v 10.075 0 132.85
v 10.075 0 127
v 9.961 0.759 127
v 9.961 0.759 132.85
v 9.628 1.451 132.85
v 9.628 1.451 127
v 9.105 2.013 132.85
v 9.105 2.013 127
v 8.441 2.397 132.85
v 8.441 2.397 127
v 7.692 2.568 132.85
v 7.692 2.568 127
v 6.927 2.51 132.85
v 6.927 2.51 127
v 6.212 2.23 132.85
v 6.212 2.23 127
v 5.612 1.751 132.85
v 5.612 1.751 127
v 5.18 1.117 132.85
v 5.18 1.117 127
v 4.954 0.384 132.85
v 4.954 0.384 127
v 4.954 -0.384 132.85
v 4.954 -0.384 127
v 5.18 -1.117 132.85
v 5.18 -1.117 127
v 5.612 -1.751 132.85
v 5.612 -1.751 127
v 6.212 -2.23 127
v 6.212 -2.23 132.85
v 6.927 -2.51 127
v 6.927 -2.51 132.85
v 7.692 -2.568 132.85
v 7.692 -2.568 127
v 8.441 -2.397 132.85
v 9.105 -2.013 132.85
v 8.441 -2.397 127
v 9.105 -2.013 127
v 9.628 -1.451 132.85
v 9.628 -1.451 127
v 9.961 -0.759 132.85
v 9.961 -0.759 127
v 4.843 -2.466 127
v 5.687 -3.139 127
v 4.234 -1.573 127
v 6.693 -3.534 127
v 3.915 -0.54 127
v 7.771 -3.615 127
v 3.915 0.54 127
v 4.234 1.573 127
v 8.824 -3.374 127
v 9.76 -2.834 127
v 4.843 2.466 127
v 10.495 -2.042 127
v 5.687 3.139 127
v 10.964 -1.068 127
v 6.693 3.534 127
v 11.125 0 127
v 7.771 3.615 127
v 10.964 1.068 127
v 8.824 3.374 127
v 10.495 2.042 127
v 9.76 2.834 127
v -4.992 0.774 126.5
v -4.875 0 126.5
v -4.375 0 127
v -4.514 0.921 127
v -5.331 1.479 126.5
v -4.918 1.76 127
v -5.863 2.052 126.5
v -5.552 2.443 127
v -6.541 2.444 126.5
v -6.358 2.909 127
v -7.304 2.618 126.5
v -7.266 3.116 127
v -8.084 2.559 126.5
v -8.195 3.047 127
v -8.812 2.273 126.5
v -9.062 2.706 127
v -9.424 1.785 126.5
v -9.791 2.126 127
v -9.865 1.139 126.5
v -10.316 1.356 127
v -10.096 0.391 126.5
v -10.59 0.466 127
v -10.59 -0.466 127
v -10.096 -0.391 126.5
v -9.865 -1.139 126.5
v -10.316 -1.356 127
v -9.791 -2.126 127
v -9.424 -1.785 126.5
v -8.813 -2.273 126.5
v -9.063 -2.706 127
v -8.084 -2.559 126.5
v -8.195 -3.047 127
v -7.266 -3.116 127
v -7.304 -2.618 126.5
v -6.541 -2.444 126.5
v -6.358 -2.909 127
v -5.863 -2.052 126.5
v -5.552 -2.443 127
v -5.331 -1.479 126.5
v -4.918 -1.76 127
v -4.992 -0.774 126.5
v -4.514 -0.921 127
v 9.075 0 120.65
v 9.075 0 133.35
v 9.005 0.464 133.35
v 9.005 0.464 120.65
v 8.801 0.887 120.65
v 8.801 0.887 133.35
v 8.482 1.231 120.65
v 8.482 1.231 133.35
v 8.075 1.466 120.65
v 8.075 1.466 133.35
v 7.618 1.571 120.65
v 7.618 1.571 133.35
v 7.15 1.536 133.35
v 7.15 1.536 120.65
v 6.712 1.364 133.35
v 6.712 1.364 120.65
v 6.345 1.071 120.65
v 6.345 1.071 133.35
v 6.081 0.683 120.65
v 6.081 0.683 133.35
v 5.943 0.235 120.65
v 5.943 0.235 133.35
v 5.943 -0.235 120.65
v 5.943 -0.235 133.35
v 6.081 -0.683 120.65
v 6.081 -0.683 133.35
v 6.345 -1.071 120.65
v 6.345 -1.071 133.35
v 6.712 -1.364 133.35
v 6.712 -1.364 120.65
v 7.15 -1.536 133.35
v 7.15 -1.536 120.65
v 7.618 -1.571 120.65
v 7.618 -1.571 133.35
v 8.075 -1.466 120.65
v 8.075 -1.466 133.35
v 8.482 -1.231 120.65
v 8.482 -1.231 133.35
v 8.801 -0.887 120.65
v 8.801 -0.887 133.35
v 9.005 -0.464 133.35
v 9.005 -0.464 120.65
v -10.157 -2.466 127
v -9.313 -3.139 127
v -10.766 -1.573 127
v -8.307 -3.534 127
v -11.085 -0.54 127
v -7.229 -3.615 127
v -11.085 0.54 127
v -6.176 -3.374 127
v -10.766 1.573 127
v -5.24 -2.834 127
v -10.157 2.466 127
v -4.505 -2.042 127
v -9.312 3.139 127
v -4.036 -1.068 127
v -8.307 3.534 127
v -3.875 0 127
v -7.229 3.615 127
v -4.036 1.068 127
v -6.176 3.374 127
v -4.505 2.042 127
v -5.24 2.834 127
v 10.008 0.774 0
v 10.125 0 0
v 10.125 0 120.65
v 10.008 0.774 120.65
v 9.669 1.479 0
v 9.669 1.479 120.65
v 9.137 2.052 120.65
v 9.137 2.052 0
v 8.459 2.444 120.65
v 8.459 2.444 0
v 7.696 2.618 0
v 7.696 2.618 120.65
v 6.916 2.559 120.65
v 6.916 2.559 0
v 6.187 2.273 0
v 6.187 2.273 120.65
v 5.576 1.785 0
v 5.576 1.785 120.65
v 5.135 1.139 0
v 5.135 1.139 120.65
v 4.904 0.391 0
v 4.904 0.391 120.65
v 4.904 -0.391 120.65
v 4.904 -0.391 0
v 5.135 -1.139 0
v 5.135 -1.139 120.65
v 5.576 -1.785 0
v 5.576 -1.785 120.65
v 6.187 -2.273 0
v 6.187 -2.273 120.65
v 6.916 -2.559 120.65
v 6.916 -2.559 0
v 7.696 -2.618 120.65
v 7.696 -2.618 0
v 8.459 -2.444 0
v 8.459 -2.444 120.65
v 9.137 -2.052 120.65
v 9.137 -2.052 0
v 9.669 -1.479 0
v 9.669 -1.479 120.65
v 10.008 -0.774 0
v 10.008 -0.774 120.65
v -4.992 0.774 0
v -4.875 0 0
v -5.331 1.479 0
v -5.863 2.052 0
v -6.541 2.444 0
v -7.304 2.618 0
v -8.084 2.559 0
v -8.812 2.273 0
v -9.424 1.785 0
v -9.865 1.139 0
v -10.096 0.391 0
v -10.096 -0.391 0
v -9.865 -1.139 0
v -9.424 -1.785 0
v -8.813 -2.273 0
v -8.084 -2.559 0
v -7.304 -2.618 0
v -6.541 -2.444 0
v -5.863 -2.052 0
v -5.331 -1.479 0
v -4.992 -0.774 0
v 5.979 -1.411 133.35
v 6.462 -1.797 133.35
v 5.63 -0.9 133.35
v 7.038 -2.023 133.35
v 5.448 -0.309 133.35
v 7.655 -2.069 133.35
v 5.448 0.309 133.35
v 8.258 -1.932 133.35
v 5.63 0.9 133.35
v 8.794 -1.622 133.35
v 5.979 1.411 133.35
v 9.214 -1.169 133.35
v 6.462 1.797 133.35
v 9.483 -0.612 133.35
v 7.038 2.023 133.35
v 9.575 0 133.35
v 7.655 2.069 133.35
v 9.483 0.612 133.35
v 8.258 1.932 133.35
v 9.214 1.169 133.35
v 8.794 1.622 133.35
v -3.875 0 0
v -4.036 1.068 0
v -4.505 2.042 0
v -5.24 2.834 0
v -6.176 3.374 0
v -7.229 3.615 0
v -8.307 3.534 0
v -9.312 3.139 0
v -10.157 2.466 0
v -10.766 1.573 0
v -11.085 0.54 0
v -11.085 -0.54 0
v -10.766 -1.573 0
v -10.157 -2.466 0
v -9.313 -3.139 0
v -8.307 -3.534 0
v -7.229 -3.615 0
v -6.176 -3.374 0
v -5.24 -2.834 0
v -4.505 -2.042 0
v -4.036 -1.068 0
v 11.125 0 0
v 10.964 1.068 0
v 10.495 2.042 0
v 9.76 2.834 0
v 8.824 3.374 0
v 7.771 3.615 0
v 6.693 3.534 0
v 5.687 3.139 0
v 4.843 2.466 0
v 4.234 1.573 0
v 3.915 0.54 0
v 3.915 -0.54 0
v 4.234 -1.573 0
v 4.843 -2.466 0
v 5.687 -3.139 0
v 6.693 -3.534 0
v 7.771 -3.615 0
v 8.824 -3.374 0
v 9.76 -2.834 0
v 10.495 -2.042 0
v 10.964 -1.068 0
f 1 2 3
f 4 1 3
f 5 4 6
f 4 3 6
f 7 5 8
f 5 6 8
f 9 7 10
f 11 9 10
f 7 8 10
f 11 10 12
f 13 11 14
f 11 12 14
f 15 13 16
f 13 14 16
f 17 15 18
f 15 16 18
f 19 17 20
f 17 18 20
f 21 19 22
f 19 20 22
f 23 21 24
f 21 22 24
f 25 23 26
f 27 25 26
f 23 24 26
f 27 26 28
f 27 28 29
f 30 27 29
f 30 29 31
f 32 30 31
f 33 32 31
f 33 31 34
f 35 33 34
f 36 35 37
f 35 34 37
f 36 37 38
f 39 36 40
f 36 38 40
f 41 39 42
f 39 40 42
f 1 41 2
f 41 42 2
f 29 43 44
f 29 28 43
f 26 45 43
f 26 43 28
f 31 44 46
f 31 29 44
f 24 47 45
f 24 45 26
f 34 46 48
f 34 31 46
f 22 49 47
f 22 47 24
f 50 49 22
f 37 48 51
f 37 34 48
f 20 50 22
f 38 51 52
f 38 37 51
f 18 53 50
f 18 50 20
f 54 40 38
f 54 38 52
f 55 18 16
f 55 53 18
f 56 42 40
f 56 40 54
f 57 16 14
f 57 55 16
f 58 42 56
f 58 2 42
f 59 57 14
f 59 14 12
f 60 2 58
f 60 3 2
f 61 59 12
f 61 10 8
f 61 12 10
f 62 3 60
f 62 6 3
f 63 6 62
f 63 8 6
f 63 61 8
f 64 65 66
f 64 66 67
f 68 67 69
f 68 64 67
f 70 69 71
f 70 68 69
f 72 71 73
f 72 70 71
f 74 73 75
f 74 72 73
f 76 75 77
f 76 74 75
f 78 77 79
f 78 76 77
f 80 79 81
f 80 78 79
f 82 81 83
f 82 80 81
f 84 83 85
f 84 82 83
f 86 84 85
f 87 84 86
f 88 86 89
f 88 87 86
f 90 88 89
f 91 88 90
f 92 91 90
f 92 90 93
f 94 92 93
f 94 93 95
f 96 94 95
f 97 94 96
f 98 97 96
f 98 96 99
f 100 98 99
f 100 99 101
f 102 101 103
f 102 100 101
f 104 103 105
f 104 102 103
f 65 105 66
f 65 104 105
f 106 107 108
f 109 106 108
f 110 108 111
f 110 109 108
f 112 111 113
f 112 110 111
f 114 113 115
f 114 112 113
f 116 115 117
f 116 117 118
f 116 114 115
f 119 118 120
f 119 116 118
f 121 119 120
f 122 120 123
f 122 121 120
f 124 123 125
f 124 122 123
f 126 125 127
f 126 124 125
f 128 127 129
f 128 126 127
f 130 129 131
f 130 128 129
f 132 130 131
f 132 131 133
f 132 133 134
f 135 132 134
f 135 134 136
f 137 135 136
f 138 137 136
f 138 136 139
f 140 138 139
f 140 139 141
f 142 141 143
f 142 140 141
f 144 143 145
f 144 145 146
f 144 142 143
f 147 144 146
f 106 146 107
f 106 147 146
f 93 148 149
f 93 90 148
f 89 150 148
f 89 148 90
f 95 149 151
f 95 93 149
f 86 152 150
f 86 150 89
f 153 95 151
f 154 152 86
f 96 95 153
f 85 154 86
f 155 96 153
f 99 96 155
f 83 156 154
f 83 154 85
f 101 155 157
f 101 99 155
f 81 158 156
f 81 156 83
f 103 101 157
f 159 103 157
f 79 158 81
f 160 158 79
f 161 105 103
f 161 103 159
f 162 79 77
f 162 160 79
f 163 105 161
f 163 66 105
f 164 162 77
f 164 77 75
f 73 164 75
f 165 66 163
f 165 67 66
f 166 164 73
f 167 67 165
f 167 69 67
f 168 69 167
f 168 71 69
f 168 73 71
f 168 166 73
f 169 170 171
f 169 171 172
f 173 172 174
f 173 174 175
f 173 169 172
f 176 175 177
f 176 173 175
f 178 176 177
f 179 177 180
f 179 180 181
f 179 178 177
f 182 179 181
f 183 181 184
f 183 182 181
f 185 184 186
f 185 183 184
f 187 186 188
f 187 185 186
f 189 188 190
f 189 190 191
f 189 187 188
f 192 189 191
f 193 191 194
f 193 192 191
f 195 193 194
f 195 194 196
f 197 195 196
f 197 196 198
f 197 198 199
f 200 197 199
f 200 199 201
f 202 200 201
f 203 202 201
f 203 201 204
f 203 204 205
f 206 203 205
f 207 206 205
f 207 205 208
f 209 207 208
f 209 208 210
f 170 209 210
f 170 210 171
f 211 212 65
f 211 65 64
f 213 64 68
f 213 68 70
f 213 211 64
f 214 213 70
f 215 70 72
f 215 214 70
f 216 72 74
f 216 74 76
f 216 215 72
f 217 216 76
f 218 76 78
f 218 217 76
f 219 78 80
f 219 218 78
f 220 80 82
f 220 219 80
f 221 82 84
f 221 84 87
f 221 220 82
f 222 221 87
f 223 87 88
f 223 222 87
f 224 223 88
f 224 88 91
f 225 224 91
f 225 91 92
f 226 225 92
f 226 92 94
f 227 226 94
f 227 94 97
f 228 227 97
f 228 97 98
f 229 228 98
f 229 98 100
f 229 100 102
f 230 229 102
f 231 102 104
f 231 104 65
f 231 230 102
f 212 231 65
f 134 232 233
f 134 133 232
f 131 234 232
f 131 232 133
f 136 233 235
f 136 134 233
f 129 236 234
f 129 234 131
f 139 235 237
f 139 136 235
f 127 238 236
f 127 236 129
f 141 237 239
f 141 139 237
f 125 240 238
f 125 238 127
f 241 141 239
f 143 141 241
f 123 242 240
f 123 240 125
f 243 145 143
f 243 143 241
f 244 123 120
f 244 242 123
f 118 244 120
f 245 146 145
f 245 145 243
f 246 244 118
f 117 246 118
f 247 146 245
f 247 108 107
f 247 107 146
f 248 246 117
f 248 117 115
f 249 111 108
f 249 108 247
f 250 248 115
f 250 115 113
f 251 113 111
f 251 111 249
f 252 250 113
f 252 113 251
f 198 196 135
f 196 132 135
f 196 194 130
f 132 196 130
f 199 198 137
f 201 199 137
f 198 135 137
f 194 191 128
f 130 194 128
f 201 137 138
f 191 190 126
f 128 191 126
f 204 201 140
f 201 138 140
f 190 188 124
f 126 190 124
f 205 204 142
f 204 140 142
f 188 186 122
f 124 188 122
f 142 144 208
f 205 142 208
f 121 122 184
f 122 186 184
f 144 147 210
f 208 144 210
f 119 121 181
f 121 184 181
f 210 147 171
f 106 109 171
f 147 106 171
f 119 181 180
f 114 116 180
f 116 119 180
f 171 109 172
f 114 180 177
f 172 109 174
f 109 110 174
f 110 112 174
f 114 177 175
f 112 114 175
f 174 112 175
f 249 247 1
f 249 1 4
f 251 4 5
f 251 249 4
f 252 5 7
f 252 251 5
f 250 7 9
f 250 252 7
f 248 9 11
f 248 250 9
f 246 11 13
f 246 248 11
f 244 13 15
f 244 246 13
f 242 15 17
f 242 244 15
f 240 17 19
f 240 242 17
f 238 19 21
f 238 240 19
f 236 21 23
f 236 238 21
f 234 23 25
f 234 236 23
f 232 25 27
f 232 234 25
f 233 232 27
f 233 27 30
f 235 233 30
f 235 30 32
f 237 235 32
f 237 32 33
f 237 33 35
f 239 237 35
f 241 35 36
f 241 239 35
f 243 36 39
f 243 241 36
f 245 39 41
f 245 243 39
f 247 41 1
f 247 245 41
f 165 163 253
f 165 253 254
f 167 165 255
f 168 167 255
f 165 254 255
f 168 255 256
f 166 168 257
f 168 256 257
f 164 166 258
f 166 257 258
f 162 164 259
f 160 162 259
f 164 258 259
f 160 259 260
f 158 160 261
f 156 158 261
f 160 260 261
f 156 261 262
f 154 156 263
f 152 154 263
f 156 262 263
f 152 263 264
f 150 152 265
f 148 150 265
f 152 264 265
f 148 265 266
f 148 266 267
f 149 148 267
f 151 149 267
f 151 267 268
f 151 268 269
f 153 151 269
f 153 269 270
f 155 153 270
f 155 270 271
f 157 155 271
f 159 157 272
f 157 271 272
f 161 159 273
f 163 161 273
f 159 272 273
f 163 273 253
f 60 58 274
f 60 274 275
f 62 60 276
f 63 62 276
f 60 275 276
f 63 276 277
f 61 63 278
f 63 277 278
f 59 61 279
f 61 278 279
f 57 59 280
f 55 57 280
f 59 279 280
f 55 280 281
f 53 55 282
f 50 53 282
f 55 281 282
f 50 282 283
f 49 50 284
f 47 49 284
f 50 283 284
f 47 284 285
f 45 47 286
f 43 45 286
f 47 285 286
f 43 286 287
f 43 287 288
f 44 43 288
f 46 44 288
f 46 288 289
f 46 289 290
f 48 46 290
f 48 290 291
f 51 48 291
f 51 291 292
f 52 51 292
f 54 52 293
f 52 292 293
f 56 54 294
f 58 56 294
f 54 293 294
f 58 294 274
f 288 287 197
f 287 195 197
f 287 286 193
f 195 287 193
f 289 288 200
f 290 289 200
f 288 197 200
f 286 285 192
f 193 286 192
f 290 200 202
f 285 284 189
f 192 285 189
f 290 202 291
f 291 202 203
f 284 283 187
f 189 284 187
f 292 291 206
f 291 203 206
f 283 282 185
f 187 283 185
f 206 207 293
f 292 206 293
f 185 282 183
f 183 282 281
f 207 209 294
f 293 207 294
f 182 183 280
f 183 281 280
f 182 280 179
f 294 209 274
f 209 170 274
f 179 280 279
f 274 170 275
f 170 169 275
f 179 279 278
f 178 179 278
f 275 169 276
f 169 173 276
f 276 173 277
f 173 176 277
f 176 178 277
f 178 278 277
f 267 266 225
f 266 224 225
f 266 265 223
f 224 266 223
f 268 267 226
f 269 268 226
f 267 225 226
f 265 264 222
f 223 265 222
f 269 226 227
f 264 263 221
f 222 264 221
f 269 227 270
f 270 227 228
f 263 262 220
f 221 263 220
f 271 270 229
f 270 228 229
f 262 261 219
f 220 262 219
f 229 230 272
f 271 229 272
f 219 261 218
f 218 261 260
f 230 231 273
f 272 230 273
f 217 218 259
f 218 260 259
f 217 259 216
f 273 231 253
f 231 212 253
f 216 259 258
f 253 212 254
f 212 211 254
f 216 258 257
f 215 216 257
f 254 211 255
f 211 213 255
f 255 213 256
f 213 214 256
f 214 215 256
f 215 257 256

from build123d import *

# Parameters (mm, degrees)
F0_R     = 3.625
F0_R_2   = 2.625
F1_DEPTH = 127
F2_R     = 2.625
F2_R_2   = 1.575
F3_DEPTH = 6.35
F4_R     = 2.575
F4_R_2   = 1.575
F5_DEPTH = 6.35
F6_SIZE  = 0.5


with BuildPart() as f1:
    # F0 (on Top) → F1 (new body)
    with BuildSketch(Plane.XY):
        with Locations((-7.5, 0)):
            Circle(F0_R)
        with Locations((-7.5, 0)):
            Circle(F0_R_2, mode=Mode.SUBTRACT)
        with Locations((7.5, 0)):
            Circle(F0_R)
        with Locations((7.5, 0)):
            Circle(F0_R_2, mode=Mode.SUBTRACT)
    extrude(amount=F1_DEPTH)

    # F2 (on face) → F3 (join)
    with BuildSketch(Plane.XY.offset(127)):
        with Locations((7.5, 0)):
            Circle(F2_R)
        with Locations((7.5, 0)):
            Circle(F2_R_2, mode=Mode.SUBTRACT)
    extrude(amount=-F3_DEPTH)

    # F4 (on face) → F5 (join)
    with BuildSketch(Plane.XY.offset(127)):
        with Locations((7.5, 0)):
            Circle(F4_R)
        with Locations((7.5, 0)):
            Circle(F4_R_2, mode=Mode.SUBTRACT)
    extrude(amount=F5_DEPTH)

    # F6
    f6_edges = [f1.edges().sort_by_distance(p)[0] for p in [
        (4.925, 0, 133.35),
        (-10.125, 0, 127),
    ]]
    chamfer(f6_edges, length=F6_SIZE)


solid = f1.part
